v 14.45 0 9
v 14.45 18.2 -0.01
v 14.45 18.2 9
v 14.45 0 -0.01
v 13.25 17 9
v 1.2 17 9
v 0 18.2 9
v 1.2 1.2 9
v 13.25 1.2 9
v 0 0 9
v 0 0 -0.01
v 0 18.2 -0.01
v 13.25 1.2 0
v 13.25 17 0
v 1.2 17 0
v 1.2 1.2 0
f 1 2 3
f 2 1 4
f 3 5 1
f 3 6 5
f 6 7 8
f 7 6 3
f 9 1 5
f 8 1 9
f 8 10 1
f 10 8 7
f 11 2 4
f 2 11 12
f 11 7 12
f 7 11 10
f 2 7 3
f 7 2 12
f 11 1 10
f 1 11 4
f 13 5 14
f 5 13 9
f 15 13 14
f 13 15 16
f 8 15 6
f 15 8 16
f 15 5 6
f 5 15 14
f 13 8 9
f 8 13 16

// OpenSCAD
// file: ../Base/Rotation.scad
// Fischertechnik Box Foundation
// Geometry Helpers Rotation

include <PlacementOptions.scad>

// getRotatedSpace(space, rotation=NoRotation)
// Rotates the space dependent on the specified rotation

function getRotatedSpace(space, rotation=NoRotation) = [
    (rotation == Rotate90 || rotation == Rotate270) ? space.y : space.x,
    (rotation == Rotate90 || rotation == Rotate270) ? space.x : space.y
];

// Rotates the given space around the fixed left lower corner
// space = the space the children needs as width/depth list [width,depth]
// rotation = 0 Rotate0 degrees, 1 Rotate90 degrees, 2 Rotate180 degrees, 3 Rotate270 degrees (equivalent to -90)

module RotateFix(space, rotation=NoRotation) {
    dy = (rotation == Rotate0 || rotation == Rotate270) ? 0 :
        (rotation == Rotate90) ? space.x :
        space.y;
    dx = (rotation < Rotate180) ? 0 :
        (rotation == Rotate180) ? space.x :
        space.y;
    
    translate([dx, dy, 0])
        rotate([0, 0, rotations[rotation]])
            children();
}
// file: ../Base/Alignment.scad
// Fischertechnik Box Foundation
// Geometry Helpers Alignment

include <PlacementOptions.scad>

// getAlignedX(elementWidth, spaceWidth, align=AlignRight, offset=0)
// Gets the aligned X offset of an element with the given
// width in the given space.
// elementWidth = The width of the element to positon
// spaceWidth = The space where the element should be aligned
// align = 0 AlignLeft, 1 AlignCenter, 2 AlignRight
// offset = an optional offset from the aligned position. When
// aligned left or centered, then positive values are in X direction.
// When aligned right then positive values are in negative X direction.

function getAlignedX(elementWidth, spaceWidth, align=AlignRight, offset=0) =
    (align == AlignLeft) ?
        offset :
        ((align == AlignCenter) ?
        (spaceWidth - elementWidth)/2 + offset :
        spaceWidth - offset - elementWidth);

// getAlignedY(elementDepth, spaceDepth, align=AlignTop, offset=0)
// Gets the aligned Y offset of an element with the given
// depth in the given space.
// elementDepth = The depth of the element to positon
// spaceDepth = The space where the element should be aligned
// align = 0 AlignBottom, 1 AlignCenter, 2 AlignTop
// offset = an optional offset from the aligned position. When
// aligned bottom or centered, then positive values are in Y direction.
// When aligned top then positive values are in negative Y direction.

function getAlignedY(elementDepth, spaceDepth, align=AlignTop, offset=0) =
    (align == AlignBottom) ?
        offset :
        ((align == AlignCenter) ?
        (spaceDepth - elementDepth)/2 + offset :
        spaceDepth - offset - elementDepth);
// file: ../Base/PlacementOptions.scad
// Fischertechnik Box Foundation
// Placement Options

// Alignment
NoAlign = 0;
AlignLeft = 1;
AlignBottom = 2;
AlignCenter = 3;
AlignRight = 4;
AlignTop = 5;

// Element rotation degree steps
rotations = [0, -90, -180, -270];

// Rotation
NoRotation = 0;
Rotate0 = 0;
Rotate90 = 1;
Rotate180 = 2;
Rotate270 = 3;

// Docking (seen from above)
NoDock = -1;
DockLeft = 0;
DockTop = 1;
DockRight = 2;
DockCorner = 2;
DockBottom = 3;

// Web corners
LowerLeft = 0;
UpperLeft = 1;
UpperRight = 2;
LowerRight = 3;

// Web position relative to corner
LeftOfCorner = 0;
RightOfCorner = 1;
// file: ../Base/Boxes.scad
// Fischertechnik Box Foundation
// Pre-designed Boxes

use <Constants.scad>

include <PlacementOptions.scad>

box190Width = 190;
box190Depth = 130;
box130Width = 130;
box130Depth = 95;

// Values are from an original ec3 box
topBottomDifference = 1.5;
outerHeight = 40;
innerHeight = 38.2;
baseThickness = outerHeight - innerHeight;
stackExcess = 5.7;
radius = 3.5;
wallThickness = 1.5;
tolerance = 0.2;
stackOffset = innerHeight - stackExcess;

boxUsageHeight = stackOffset;
boxWallThickness = wallThickness;
boxBaseThickness = baseThickness;
boxWebWidth = 3.0;

// getBoxWallThickness()
// Gets the wall thickness of a Fischertechnik Box
function getBoxWallThickness() = boxWallThickness;

// getBoxUsageHeight()
// Gets the usable height of a Fischertechnik box
function getBoxUsageHeight() = boxUsageHeight;

// getBoxInnerHeight()
// Gets the inner height of a Fischertechnik box, including the stack excess
function getBoxInnerHeight() = innerHeight;

// getBoxBaseThickness()
// Gets the thickness of the Fischertechnik box base.
function getBoxBaseThickness() = boxBaseThickness;

// getBoxWebWidth()
// Gets the width of a box web
function getBoxWebWidth() = boxWebWidth;

// getBox190Space()
// Gets the usable inner space of a Box 190 as an x/y-list
function getBox190Space() = [
    box190Width - 2*getBoxWallThickness() - topBottomDifference, 
    box190Depth - 2*getBoxWallThickness() - topBottomDifference ];

// RoundedCornerPlate(width, depth, height, radius)
// Creates a body plate with rounded corners for a box. Used
// also to create the complete box with the hull module.
// width = Width of the plate
// depth = depth of the plate 
// height = thickness of the plate
// radius = radius of the rounded corner
module RoundedCornerPlate(width, depth, height, radius) {
    translate([radius, radius])
    hull() {
        w = width-2*radius;
        d = depth-2*radius;
        cube([w, d, height]);
        cylinder(height, r=radius, $fn=getFragments());
        translate([w, 0])
            cylinder(height, r=radius, $fn=getFragments());
        translate([w, d])
            cylinder(height, r=radius, $fn=getFragments());
        translate([0, d])
            cylinder(height, r=radius, $fn=getFragments());
    }
}

// BoxBase(width, depth)
// Creates an empty stackable Fischertechnik compatible box
// width = Outer width of the box (190, 130, ...)
// depth = Outer depth of the box (130, 95, ...)

module BoxBase(width, depth, height=outerHeight) {    
    thinPlate = 0.01;

    innerHeight = height - baseThickness;    
    
    module Body(tolerance=tolerance) {
        hull() {
            // Bottom with tolerance to fit into the original boxes when stacked
            translate([-wallThickness+tolerance, -wallThickness+tolerance, -baseThickness])
                RoundedCornerPlate(width-topBottomDifference-2*tolerance, depth-topBottomDifference-2*tolerance, thinPlate, radius);
            
            // Top
            translate([-wallThickness-topBottomDifference/2, -wallThickness-topBottomDifference/2, innerHeight-thinPlate])
                RoundedCornerPlate(width, depth, thinPlate, radius);
         }
    }

    module Cutoff() {
        hull() {
            coWidth = width - 2*wallThickness;
            coDepth = depth - 2*wallThickness;
            
            // Bottom
            RoundedCornerPlate(coWidth-topBottomDifference, coDepth-topBottomDifference, thinPlate, radius);

            // Top
            translate([-topBottomDifference/2, -topBottomDifference/2, innerHeight+thinPlate]) 
                RoundedCornerPlate(coWidth, coDepth, thinPlate, radius);
        }
    }
    
    difference() {        
        Body();
        Cutoff();
        stackOffset = innerHeight - stackExcess;
        translate([0, 0, stackOffset + baseThickness])
            Body(tolerance=0);
    }
}

// Creates the Fischertechnik empty box 130x190 mm and places it at position 0,0
// 190x130 are the outer sizes, the inner space is slightly smaller. Use getBox190Space() to get the inner sizes.
// The box is positioned that the usable inner space is at the 0,0,0 position.

module Box190() {
    BoxBase(box190Width, box190Depth);
}

// Gets the usable inner space of a Box 130 as an x/y-list
function getBox130Space() = [
    box130Width - 2*getBoxWallThickness() - topBottomDifference, 
    box130Depth - 2*getBoxWallThickness() - topBottomDifference ];

// Creates the Fischertechnik empty box 95x130 mm and places it at position 0,0
// 190x130 are the outer sizes, the inner space is slightly smaller. Use getBox190Space() to get the inner sizes.
// The box is positioned that the usable inner space is at the 0,0,0 position.

module Box130() {
    BoxBase(box130Width, box130Depth);
}

// Creates a web at the specified box walls
// corner 0 = LowerLeft, 1 = UpperLeft, 2 = UpperRight, 3 = LowerRight
// side 0 = LeftOfCorner, 1 = RightOfCorner
// distance = Distance in mm from the corner
// boxSpace = inner width and depth of the box (default: Box 190)
// webWidth = length of the web (default is 3 mms)
// webThickness = thickness of the web (default is 1 mm)

module BoxWeb(corner, side, distance, boxSpace=getBox190Space(), webWidth=getBoxWebWidth(), webThickness=1.0) {
    sink = getBoxWallThickness()/2;

    width = (corner % 2 == 0) ? 
            (side == LeftOfCorner ? webWidth : webThickness) :
            (side == LeftOfCorner ? webThickness : webWidth);

    depth = (corner % 2 == 0) ? 
            (side == RightOfCorner ? webWidth : webThickness) :
            (side == RightOfCorner ? webThickness : webWidth);
    
    xDiff = corner == LowerLeft ? 
                (side == LeftOfCorner ? -sink : distance) :
            (corner == UpperLeft ?                
                (side == LeftOfCorner ? distance : -sink) :
            (corner == UpperRight ?
                (side == LeftOfCorner ? boxSpace.x-webWidth+sink : boxSpace.x-distance-webThickness) :
                (side == LeftOfCorner ? boxSpace.x-distance-webThickness: boxSpace.x-webWidth+sink)));

    yDiff = corner == LowerLeft ? 
                (side == RightOfCorner ? -sink : distance) :
            (corner == UpperLeft ?
                (side == RightOfCorner ? boxSpace.y-distance-webThickness : boxSpace.y-webWidth+sink) :
            (corner == UpperRight ?
                (side == RightOfCorner ? boxSpace.y-webWidth+sink : boxSpace.y-distance-webThickness) :
                (side == RightOfCorner ? distance : -sink)));
    
    translate([xDiff, yDiff, -getExcess()])
        cube([width, depth, boxUsageHeight + 2*getExcess()]);
}
// file: ../Base/Placement.scad
// Fischertechnik Box Foundation
// Geometry Helpers Placement

use <Constants.scad>
use <Alignment.scad>
use <Rotation.scad>
use <Boxes.scad>

include <PlacementOptions.scad>

// Place(x=0, y=0, elementSpace=[0,0], alignX=AlignLeft, alignY=AlignBottom, rotation=Rotate0, boxSpace=getBox190Space())
// Places the child at the specified position
// y = Y-Position. This is a relative position when an X aligment is specified.
// x = X-Position. This is a relative position when an Y aligment is specified.
// elementSpace = space of the element to be placed [x,y]
// alignX = -1=NoAlign, 0 AlignLeft, 1 AlignCenter, 3 AlignRight (elementSpace and boxSpace required!)
// alignY = -1=NoAlign, 2 AlignBottom, 1 AlignCenter, 4 AlignTop (elementSpace and boxSpace required!)
// rotation = 0 Rotate0 0 degrees, 1 Rotate90 90 degrees, 
// 2 Rotate180 180 degrees, 3 Rotate270 270 degrees (equivalent to -90)
// boxSpace = Inner space of the box where the placement occurs [x,y] - default is Box 190x130 inner space

module Place(x=0, y=0, elementSpace=[0,0], 
  alignX=AlignLeft, alignY=AlignBottom, 
  rotation=NoRotation, boxSpace=getBox190Space()) {

    module Position(x, y, space, rotation=Rotate0) {
        translate([x, y, 0])
            RotateFix(space, rotation)
                children();
    }

    space = getRotatedSpace(elementSpace, rotation);
    alignedX = getAlignedX(space.x, boxSpace.x, alignX, x);
    alignedY = getAlignedY(space.y, boxSpace.y, alignY, y);
    Position(alignedX, alignedY, elementSpace, rotation)
        children();
}

// Center(space=getBox130Space(), elementSpace=[0,0])
// space = Space where the children is centered. For cylinder use centered=true and no elementSpace.
// elementSpace = space of the element to be centered [x,y]

module Center(space=getBox190Space(), elementSpace=[0,0]) {
    Place(elementSpace=elementSpace, boxSpace=space, alignX=AlignCenter, alignY=AlignCenter)
        children();
}

// CenterHorizontal(width=0, y=0, offset=0, space=getBox130Space())
// width = Width of the element to be placed.
// y = Y position of the element
// offset = Offset from the center position (negative will be left of the center)
// space = Space where the element is placed

module CenterHorizontal(width=0, y=0, offset=0, space=getBox190Space()) {
    Place(x=offset, y=y, elementSpace=[width, 0], boxSpace=space, alignX=AlignCenter)
        children(0);
}

// CenterVertical(depth=0, x=0, offset=0, space=getBox130Space())
// depth = Depth of the element to be placed.
// x = X position of the element
// offset = Offset from the center position (negative will be down of the center)
// space = Space where the element is placed

module CenterVertical(depth=0, x=0, offset=0, space=getBox190Space()) {
    Place(x=x, y=offset, elementSpace=[0, depth], boxSpace=space, alignY=AlignCenter)
        children(0);
}

// getIsVertical(align)
// True if the specified alignment needs a vertical orientation for a divider (AlignRight, AlignLeft)

function getIsVertical(align) = (align == AlignRight || align == AlignLeft);

// getIsHorizontal(align)
// True if the specified alignment needs a horizontal orientation for a divider (AlignTop, AlignBottom)

function getIsHorizontal(align) = (align == AlignTop || align == AlignBottom);
// file: ../Base/Constants.scad
// Fischertechnik Box Foundation
// Constants

// Constant values necessary for multiple elements

// Base constants
dividerThickness = 1.2;
excess = 0.01;
fragments = 90;
tolerance = 0.8;

// Gets the thickness of a divider 
function getDividerThickness() = dividerThickness;

// Gets the excess that is used to merge walls into each other
function getExcess() = excess;

// Gets amount of fragments of a cylinder
function getFragments() = fragments;

// Gets the inner tolerance of a frame to each side
function getTolerance() = tolerance;


// Fischertechnik specific constants
axisDiameter = 4;
axisBottomDiameter = axisDiameter + 1;
axisTolerance = 0.2;

// Gets axis diameter of Fischertechnik axis
function getAxisDiameter() = axisDiameter;

// Gets axis diameter tolerance (subtracted for element axis)
function getAxisTolerance() = axisTolerance;

// Gets the axis diameter for standing axis
function getStandAxisDiameter() = getAxisDiameter() - getAxisTolerance();

// Gets axis bottom diameter for thicker part at the bottom
function getAxisBottomDiameter() = axisBottomDiameter;

standardEdgeDistance = 2.5;
standardWebDistance = 11.5;
standardCornerLength = 15;

// gets the standard distance to the wall of the box for dockable frames with webs
function getStandardEdgeDistance() = standardEdgeDistance;

// gets the standard distance of each web to the corner of the dockable frame
function getStandardWebDistance() = standardWebDistance;

// gets the standard length of the corner walls of a dockable frame
function getStandardCornerLength() = standardCornerLength;

tubeWallFactor = 0.8;

// gets the wall thickness of a tube.
function getTubeWallThickness() = tubeWallFactor * getDividerThickness();

smallPartsFrameHeight = 20;

// gets the frame height for docked small parts boxes.
function getSmallPartsFrameHeight() = smallPartsFrameHeight;

hubRingDiameter = 19.5;
hubRingLevelDiameter = 21;

// gets the diameter of a tube matching the inner ring of a wheel
function getHubRingDiameter() = hubRingDiameter;

// gets the diameter of a hub tube with a thicker diameter
function getHubRingLevelDiameter() = hubRingLevelDiameter;
// main file
// Fischertechnik Box Library
// Frame for right angle blocks
// 31012

use <../Base/Constants.scad>
use <../ModelBase/Simple.scad>

/* [Element Parameters] */
count = 1;

/* [Hidden] */
width = 45 / 4;
depth = 15;
height = 9;

// getFrameAngleRightSpace
// Gets the space the right angle block needs for count blocks as width and depth (.x and .y as a list)
// count = Count of right angle blocks

function getFrameAngleIsoscelesSpace(count=1) = getFrameOuterVolume([width * count, depth, height]);

// FrameAngleRight(count)
// count = Count of right angle blocks in x direction
// The walls of the frame are 9 mm high.
// The complete frame has a tolerance of addition 1 mm in each direction.

module FrameAngleRight(count=1) {
    Frame([width * count, depth, height]);
}

// Tests
color ("lightgray")
FrameAngleRight(count);
